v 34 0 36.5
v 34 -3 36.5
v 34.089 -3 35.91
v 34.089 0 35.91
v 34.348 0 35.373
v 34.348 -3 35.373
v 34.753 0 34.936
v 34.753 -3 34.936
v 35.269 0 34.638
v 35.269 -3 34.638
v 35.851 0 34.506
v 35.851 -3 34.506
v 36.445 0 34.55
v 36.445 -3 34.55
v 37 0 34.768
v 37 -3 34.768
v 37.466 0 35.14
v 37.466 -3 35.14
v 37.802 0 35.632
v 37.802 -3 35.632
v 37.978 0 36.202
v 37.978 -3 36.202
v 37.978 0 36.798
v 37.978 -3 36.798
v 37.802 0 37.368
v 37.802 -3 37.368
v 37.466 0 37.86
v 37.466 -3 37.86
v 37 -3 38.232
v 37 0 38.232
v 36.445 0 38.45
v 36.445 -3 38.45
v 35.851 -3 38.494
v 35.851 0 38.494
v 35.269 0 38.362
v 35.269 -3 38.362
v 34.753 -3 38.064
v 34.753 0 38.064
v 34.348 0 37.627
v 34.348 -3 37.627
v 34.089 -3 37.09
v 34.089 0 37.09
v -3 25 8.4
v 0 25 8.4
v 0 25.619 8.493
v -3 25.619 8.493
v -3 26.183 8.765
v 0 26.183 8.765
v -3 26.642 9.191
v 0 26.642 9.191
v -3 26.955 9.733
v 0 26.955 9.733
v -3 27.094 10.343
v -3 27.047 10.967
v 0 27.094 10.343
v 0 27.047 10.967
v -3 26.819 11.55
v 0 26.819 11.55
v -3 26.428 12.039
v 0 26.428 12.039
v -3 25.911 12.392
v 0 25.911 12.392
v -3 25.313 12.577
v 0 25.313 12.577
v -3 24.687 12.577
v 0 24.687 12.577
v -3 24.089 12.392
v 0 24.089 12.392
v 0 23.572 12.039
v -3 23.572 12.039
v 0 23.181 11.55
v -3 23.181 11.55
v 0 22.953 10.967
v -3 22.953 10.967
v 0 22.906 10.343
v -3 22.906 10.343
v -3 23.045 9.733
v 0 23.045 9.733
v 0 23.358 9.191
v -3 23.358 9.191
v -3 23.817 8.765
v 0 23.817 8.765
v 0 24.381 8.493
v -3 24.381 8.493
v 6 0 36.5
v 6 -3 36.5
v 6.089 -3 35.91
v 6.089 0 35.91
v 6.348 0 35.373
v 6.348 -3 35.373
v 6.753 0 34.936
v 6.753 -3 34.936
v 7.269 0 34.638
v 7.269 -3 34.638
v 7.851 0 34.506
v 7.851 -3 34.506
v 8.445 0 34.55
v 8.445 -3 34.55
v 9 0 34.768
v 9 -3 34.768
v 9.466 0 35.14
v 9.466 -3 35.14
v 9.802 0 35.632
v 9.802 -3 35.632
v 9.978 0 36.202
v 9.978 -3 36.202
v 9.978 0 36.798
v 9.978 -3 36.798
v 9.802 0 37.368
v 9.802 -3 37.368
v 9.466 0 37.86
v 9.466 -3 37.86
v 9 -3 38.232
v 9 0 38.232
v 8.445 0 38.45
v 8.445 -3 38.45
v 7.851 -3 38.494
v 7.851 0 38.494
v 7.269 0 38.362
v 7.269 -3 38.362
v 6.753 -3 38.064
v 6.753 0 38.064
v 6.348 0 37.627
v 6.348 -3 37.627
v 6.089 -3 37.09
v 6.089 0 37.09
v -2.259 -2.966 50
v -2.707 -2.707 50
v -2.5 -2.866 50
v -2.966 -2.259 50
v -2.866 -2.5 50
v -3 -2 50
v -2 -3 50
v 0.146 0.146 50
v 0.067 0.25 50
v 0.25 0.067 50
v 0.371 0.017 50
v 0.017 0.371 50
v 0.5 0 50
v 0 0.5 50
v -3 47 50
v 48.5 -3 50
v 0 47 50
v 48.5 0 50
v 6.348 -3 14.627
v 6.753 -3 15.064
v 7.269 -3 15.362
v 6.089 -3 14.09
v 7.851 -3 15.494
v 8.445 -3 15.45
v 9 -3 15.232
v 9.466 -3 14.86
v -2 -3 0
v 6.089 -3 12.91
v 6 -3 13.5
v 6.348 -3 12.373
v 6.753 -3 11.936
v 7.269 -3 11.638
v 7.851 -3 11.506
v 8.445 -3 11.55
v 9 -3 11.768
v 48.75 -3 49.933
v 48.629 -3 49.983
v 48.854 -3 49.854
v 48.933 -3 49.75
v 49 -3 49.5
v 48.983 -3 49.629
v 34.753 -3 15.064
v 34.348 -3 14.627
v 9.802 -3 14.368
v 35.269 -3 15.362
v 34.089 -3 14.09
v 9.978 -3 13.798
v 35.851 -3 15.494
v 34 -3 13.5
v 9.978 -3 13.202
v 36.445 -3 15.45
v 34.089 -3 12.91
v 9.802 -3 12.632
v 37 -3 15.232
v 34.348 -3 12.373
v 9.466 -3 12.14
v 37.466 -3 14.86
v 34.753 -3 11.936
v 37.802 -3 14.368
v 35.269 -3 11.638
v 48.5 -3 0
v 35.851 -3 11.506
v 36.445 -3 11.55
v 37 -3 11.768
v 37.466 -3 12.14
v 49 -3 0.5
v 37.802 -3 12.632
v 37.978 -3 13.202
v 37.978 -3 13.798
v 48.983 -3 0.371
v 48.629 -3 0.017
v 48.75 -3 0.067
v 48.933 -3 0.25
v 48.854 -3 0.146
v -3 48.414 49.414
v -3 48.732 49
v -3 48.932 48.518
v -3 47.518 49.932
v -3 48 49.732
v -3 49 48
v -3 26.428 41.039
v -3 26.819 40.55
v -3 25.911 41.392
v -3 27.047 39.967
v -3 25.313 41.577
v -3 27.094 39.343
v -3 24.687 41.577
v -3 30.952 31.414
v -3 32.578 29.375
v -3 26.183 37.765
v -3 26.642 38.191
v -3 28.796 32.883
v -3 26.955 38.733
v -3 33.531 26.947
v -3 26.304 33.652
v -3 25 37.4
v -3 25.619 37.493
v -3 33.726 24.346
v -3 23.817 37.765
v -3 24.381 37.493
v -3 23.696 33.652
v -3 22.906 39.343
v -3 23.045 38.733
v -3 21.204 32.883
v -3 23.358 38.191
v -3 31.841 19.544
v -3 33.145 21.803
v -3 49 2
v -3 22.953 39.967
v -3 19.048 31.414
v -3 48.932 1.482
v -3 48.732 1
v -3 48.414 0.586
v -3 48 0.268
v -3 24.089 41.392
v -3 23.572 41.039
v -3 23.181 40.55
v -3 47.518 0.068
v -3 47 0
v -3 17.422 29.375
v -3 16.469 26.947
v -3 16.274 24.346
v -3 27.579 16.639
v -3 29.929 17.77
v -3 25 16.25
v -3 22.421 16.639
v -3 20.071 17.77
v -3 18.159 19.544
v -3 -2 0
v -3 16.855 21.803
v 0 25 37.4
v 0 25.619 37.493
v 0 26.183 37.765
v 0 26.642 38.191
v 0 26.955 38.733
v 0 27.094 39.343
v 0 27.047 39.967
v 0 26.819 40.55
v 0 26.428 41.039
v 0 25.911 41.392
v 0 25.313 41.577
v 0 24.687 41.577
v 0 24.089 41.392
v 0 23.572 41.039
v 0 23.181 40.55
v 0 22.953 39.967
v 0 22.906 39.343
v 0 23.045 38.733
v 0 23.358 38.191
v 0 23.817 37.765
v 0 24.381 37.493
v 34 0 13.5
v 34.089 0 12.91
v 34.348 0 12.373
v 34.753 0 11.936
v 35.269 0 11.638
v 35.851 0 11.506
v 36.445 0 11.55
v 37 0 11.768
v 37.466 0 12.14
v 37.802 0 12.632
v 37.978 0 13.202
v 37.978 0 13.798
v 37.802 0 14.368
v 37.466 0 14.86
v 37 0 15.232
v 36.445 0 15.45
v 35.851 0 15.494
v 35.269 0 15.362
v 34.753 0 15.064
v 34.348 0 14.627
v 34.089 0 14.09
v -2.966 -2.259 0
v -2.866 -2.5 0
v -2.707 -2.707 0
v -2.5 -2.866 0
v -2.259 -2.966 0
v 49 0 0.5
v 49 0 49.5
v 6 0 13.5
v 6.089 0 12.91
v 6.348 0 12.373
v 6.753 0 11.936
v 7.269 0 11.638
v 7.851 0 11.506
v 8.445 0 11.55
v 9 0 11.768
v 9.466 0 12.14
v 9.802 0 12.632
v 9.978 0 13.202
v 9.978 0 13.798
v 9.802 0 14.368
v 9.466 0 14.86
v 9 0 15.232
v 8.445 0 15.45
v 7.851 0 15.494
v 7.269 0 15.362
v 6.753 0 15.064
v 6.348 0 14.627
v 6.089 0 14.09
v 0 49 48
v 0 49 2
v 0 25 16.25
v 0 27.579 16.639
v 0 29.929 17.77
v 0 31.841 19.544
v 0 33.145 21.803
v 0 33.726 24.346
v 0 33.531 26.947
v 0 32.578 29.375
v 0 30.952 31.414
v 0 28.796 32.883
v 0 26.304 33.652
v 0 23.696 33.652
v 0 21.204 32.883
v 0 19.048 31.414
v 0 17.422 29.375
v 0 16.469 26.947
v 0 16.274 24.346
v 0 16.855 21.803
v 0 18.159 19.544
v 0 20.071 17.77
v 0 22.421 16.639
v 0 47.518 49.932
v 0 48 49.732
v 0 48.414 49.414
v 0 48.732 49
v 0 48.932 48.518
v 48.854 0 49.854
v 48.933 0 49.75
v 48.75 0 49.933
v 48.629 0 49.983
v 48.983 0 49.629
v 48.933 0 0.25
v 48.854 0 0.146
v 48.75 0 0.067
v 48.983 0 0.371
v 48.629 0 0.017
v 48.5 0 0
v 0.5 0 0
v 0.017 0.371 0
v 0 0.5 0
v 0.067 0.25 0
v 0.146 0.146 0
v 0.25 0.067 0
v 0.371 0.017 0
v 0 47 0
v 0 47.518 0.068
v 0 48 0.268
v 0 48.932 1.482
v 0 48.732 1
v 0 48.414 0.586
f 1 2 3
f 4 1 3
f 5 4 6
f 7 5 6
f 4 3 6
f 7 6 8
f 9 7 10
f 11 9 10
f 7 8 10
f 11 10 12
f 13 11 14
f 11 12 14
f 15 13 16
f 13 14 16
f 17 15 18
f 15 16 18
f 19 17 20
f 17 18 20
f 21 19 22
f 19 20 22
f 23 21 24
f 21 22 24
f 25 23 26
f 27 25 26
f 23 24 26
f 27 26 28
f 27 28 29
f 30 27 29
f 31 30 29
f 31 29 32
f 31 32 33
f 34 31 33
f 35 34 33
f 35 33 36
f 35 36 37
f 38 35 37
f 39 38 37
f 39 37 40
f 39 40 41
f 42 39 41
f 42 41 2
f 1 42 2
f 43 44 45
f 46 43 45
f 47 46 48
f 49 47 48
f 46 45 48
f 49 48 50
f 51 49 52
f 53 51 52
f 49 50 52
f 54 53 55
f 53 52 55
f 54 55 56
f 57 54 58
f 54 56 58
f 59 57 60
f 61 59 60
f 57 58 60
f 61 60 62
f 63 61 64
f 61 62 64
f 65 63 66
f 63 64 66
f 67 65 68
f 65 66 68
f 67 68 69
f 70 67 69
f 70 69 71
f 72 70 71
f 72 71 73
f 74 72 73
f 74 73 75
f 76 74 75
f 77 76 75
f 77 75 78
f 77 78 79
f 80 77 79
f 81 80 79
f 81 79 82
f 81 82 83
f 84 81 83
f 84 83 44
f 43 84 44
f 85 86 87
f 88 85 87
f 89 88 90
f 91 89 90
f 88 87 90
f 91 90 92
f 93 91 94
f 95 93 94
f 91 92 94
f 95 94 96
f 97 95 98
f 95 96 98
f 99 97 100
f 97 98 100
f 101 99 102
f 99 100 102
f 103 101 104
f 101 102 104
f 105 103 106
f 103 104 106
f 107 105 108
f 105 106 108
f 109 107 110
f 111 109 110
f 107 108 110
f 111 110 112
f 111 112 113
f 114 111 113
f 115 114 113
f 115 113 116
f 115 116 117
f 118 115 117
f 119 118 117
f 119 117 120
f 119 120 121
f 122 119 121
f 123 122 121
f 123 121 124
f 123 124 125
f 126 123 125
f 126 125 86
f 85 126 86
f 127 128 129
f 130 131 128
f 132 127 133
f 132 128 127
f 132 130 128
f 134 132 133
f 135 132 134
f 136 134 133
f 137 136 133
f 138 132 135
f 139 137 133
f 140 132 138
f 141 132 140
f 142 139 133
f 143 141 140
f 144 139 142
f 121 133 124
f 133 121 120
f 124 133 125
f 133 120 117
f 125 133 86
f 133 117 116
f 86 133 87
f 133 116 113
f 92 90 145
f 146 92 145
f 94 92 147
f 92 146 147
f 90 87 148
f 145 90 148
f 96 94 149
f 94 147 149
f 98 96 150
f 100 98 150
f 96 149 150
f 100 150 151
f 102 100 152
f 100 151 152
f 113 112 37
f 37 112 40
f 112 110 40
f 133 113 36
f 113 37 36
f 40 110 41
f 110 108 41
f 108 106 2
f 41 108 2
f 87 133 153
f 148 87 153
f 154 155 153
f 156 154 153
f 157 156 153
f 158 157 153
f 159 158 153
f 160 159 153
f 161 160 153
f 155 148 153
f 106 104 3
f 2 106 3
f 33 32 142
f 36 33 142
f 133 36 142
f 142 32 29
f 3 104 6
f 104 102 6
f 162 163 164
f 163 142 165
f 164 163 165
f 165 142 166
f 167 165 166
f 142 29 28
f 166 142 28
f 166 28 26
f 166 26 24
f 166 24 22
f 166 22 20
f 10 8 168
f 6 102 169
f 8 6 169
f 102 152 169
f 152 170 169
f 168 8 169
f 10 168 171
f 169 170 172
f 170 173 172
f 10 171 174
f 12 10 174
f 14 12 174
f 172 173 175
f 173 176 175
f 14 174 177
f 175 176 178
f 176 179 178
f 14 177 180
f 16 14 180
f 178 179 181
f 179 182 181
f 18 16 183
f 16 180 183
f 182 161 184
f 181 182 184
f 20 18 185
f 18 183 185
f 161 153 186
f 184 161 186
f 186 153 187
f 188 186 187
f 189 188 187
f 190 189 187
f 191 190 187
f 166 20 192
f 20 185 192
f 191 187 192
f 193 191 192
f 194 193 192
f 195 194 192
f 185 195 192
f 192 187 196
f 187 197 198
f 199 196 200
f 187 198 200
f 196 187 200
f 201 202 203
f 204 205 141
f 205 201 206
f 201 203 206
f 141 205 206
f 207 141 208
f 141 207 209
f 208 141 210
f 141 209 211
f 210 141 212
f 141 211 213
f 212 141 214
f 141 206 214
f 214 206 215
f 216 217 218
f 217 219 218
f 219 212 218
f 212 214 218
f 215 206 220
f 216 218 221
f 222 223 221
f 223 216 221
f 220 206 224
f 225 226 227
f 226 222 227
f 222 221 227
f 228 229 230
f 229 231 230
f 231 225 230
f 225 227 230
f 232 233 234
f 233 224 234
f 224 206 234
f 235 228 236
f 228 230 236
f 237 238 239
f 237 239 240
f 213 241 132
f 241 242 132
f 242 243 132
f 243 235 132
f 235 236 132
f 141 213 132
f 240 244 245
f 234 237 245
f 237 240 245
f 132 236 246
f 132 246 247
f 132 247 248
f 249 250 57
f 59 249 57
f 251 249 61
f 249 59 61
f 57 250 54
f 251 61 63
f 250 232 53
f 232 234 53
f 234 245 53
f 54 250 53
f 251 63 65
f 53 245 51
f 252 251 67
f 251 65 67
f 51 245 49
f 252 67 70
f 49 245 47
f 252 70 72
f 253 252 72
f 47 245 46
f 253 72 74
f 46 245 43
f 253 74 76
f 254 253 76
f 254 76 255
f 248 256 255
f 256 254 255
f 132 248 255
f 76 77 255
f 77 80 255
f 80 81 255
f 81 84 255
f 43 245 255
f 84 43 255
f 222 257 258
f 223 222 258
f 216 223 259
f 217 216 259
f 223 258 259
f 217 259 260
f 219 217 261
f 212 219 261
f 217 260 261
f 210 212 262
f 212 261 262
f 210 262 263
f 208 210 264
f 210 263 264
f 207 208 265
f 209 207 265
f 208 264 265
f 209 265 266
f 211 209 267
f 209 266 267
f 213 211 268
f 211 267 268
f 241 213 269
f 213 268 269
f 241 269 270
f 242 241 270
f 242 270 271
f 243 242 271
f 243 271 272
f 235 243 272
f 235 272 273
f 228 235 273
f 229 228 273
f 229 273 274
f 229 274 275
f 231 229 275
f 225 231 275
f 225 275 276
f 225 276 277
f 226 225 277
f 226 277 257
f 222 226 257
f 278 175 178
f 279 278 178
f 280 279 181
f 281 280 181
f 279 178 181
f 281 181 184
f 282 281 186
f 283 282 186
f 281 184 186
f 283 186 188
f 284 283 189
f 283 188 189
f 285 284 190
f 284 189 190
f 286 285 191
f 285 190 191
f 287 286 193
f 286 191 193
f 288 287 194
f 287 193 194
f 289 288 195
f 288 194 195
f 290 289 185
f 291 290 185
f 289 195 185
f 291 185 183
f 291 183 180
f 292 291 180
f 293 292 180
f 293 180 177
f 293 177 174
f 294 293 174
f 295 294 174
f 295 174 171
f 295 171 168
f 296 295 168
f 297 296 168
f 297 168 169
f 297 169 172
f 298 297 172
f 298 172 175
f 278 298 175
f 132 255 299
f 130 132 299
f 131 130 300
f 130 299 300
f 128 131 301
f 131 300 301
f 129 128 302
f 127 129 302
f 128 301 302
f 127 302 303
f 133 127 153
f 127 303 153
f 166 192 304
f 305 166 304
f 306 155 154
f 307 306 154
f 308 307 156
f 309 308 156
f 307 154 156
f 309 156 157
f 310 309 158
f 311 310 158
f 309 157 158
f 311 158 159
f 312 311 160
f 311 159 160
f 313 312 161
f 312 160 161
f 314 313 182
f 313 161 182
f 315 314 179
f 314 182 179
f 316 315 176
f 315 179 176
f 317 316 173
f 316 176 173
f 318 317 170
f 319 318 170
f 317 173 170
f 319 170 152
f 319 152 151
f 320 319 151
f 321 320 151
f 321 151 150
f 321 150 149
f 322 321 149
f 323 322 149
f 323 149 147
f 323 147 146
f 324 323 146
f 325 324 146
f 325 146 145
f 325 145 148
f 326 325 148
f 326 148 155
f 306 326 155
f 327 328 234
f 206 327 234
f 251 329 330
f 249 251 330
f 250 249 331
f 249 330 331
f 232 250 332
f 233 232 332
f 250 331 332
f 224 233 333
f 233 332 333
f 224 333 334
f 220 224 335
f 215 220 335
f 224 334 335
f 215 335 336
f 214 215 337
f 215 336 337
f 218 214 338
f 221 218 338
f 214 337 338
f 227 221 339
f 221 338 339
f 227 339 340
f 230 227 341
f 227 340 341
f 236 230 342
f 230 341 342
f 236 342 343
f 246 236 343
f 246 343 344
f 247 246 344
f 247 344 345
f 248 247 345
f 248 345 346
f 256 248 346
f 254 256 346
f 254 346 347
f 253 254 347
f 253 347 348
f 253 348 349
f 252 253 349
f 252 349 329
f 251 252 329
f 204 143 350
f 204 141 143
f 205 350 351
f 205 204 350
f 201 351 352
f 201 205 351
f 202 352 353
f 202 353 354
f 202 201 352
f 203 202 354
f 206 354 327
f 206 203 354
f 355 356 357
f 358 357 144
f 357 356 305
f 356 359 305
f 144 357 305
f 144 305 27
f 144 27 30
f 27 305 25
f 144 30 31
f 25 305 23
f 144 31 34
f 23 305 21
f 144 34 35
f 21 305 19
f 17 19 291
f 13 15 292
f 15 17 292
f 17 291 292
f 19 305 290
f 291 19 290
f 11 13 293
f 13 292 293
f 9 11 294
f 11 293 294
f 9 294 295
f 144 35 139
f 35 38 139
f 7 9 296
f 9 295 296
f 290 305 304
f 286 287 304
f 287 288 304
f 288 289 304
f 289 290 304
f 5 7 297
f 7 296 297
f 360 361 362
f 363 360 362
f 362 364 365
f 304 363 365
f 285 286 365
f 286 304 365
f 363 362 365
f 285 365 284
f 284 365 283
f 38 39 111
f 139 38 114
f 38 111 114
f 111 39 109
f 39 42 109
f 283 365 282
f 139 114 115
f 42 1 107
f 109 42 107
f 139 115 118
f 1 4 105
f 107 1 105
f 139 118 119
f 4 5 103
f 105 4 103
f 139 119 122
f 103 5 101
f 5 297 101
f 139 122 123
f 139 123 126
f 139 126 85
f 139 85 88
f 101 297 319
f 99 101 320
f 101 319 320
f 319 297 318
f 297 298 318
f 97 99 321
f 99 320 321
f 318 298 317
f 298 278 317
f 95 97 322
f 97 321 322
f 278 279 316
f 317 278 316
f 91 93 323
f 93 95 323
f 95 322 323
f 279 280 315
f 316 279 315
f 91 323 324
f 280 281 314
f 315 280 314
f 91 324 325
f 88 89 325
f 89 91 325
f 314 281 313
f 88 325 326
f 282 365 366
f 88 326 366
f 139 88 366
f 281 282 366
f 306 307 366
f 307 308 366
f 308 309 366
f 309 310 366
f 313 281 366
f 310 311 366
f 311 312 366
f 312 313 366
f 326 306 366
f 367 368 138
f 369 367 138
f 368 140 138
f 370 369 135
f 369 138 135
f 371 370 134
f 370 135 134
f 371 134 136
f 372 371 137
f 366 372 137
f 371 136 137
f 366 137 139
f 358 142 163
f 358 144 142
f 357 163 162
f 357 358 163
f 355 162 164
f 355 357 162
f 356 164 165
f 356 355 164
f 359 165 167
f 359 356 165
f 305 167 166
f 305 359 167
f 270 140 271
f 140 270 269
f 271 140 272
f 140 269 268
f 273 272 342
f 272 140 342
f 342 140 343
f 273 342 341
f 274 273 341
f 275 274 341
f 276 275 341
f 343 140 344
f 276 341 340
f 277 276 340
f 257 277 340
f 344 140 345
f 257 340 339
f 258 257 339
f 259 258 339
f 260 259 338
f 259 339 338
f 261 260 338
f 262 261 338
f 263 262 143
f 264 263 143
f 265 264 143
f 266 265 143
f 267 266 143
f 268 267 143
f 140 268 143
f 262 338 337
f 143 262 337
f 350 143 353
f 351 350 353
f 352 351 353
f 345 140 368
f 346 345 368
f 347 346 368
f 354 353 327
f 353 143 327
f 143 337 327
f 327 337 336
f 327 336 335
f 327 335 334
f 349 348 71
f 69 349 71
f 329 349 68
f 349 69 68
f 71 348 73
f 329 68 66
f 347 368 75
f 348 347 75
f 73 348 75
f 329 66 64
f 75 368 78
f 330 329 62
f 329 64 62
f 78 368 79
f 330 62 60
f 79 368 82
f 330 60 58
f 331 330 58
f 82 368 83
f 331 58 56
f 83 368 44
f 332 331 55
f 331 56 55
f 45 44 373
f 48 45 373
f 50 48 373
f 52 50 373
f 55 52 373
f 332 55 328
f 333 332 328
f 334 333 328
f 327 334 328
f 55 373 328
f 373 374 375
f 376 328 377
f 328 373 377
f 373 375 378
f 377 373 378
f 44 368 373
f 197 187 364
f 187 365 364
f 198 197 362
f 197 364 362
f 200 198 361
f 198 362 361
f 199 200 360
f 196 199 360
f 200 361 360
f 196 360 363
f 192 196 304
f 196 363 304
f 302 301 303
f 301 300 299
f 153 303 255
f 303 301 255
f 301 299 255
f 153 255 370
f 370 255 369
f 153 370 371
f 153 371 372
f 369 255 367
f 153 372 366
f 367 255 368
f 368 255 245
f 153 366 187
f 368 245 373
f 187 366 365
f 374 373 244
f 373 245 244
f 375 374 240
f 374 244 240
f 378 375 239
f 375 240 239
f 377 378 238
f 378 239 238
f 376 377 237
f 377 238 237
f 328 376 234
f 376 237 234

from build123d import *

# Parameters (mm, degrees)
BOSS_EXTRUDE1_DEPTH            = 50
SKETCH2_R                      = 8.75
SKETCH2_R_2                    = 2.1
CUT_EXTRUDE1_DEPTH             = 10
FILLET1_R                      = 2
FILLET2_R                      = 0.5
FILLET3_R                      = 0.5
HOLE_FOR_M4_300_SC_NUTS_SP_1_D = 4


with BuildPart() as part:
    # Sketch1 → Boss-Extrude1 (new body)
    with BuildSketch(Plane.XY):
        with BuildLine():
            Line((0, 0), (0, 49))
            Line((0, 49), (-3, 49))
            Line((-3, 49), (-3, -2))
            ThreePointArc((-3, -2), (-2.707106781, -2.707106781), (-2, -3))
            Line((-2, -3), (49, -3))
            Line((49, -3), (49, 0))
            Line((49, 0), (0, 0))
        make_face()
    extrude(amount=BOSS_EXTRUDE1_DEPTH)

    # Sketch2 → Cut-Extrude1 (cut)
    with BuildSketch(Plane(origin=(0, 0, 0), x_dir=(0, 0, -1), z_dir=(1, 0, 0))):
        with Locations((-25, 25)):
            Circle(SKETCH2_R)
        with Locations((-10.5, 25)):
            Circle(SKETCH2_R_2)
        with Locations((-39.5, 25)):
            Circle(SKETCH2_R_2)
    extrude(amount=-CUT_EXTRUDE1_DEPTH, mode=Mode.SUBTRACT)

    # Fillet1
    fillet1_edges = [part.edges().sort_by_distance(p)[0] for p in [
        (-1.5, 49, 50),
        (-1.5, 49, 0),
    ]]
    fillet(fillet1_edges, radius=FILLET1_R)

    # Fillet2
    fillet2_edges = [part.edges().sort_by_distance(p)[0] for p in [
        (0, 0, 25),
    ]]
    fillet(fillet2_edges, radius=FILLET2_R)

    # Fillet3
    fillet3_edges = [part.edges().sort_by_distance(p)[0] for p in [
        (49, -1.5, 50),
        (49, -1.5, 0),
    ]]
    fillet(fillet3_edges, radius=FILLET3_R)

    # Hole for M4 300® SC Nuts (SP)1 (through all)
    with Locations(Plane(origin=(0, 0, 0), x_dir=(1, 0, 0), z_dir=(0, 1, 0))):
        with Locations((36, -13.5), (8, -13.5), (36, -36.5), (8, -36.5)):
            Hole(HOLE_FOR_M4_300_SC_NUTS_SP_1_D / 2)


solid = part.part
